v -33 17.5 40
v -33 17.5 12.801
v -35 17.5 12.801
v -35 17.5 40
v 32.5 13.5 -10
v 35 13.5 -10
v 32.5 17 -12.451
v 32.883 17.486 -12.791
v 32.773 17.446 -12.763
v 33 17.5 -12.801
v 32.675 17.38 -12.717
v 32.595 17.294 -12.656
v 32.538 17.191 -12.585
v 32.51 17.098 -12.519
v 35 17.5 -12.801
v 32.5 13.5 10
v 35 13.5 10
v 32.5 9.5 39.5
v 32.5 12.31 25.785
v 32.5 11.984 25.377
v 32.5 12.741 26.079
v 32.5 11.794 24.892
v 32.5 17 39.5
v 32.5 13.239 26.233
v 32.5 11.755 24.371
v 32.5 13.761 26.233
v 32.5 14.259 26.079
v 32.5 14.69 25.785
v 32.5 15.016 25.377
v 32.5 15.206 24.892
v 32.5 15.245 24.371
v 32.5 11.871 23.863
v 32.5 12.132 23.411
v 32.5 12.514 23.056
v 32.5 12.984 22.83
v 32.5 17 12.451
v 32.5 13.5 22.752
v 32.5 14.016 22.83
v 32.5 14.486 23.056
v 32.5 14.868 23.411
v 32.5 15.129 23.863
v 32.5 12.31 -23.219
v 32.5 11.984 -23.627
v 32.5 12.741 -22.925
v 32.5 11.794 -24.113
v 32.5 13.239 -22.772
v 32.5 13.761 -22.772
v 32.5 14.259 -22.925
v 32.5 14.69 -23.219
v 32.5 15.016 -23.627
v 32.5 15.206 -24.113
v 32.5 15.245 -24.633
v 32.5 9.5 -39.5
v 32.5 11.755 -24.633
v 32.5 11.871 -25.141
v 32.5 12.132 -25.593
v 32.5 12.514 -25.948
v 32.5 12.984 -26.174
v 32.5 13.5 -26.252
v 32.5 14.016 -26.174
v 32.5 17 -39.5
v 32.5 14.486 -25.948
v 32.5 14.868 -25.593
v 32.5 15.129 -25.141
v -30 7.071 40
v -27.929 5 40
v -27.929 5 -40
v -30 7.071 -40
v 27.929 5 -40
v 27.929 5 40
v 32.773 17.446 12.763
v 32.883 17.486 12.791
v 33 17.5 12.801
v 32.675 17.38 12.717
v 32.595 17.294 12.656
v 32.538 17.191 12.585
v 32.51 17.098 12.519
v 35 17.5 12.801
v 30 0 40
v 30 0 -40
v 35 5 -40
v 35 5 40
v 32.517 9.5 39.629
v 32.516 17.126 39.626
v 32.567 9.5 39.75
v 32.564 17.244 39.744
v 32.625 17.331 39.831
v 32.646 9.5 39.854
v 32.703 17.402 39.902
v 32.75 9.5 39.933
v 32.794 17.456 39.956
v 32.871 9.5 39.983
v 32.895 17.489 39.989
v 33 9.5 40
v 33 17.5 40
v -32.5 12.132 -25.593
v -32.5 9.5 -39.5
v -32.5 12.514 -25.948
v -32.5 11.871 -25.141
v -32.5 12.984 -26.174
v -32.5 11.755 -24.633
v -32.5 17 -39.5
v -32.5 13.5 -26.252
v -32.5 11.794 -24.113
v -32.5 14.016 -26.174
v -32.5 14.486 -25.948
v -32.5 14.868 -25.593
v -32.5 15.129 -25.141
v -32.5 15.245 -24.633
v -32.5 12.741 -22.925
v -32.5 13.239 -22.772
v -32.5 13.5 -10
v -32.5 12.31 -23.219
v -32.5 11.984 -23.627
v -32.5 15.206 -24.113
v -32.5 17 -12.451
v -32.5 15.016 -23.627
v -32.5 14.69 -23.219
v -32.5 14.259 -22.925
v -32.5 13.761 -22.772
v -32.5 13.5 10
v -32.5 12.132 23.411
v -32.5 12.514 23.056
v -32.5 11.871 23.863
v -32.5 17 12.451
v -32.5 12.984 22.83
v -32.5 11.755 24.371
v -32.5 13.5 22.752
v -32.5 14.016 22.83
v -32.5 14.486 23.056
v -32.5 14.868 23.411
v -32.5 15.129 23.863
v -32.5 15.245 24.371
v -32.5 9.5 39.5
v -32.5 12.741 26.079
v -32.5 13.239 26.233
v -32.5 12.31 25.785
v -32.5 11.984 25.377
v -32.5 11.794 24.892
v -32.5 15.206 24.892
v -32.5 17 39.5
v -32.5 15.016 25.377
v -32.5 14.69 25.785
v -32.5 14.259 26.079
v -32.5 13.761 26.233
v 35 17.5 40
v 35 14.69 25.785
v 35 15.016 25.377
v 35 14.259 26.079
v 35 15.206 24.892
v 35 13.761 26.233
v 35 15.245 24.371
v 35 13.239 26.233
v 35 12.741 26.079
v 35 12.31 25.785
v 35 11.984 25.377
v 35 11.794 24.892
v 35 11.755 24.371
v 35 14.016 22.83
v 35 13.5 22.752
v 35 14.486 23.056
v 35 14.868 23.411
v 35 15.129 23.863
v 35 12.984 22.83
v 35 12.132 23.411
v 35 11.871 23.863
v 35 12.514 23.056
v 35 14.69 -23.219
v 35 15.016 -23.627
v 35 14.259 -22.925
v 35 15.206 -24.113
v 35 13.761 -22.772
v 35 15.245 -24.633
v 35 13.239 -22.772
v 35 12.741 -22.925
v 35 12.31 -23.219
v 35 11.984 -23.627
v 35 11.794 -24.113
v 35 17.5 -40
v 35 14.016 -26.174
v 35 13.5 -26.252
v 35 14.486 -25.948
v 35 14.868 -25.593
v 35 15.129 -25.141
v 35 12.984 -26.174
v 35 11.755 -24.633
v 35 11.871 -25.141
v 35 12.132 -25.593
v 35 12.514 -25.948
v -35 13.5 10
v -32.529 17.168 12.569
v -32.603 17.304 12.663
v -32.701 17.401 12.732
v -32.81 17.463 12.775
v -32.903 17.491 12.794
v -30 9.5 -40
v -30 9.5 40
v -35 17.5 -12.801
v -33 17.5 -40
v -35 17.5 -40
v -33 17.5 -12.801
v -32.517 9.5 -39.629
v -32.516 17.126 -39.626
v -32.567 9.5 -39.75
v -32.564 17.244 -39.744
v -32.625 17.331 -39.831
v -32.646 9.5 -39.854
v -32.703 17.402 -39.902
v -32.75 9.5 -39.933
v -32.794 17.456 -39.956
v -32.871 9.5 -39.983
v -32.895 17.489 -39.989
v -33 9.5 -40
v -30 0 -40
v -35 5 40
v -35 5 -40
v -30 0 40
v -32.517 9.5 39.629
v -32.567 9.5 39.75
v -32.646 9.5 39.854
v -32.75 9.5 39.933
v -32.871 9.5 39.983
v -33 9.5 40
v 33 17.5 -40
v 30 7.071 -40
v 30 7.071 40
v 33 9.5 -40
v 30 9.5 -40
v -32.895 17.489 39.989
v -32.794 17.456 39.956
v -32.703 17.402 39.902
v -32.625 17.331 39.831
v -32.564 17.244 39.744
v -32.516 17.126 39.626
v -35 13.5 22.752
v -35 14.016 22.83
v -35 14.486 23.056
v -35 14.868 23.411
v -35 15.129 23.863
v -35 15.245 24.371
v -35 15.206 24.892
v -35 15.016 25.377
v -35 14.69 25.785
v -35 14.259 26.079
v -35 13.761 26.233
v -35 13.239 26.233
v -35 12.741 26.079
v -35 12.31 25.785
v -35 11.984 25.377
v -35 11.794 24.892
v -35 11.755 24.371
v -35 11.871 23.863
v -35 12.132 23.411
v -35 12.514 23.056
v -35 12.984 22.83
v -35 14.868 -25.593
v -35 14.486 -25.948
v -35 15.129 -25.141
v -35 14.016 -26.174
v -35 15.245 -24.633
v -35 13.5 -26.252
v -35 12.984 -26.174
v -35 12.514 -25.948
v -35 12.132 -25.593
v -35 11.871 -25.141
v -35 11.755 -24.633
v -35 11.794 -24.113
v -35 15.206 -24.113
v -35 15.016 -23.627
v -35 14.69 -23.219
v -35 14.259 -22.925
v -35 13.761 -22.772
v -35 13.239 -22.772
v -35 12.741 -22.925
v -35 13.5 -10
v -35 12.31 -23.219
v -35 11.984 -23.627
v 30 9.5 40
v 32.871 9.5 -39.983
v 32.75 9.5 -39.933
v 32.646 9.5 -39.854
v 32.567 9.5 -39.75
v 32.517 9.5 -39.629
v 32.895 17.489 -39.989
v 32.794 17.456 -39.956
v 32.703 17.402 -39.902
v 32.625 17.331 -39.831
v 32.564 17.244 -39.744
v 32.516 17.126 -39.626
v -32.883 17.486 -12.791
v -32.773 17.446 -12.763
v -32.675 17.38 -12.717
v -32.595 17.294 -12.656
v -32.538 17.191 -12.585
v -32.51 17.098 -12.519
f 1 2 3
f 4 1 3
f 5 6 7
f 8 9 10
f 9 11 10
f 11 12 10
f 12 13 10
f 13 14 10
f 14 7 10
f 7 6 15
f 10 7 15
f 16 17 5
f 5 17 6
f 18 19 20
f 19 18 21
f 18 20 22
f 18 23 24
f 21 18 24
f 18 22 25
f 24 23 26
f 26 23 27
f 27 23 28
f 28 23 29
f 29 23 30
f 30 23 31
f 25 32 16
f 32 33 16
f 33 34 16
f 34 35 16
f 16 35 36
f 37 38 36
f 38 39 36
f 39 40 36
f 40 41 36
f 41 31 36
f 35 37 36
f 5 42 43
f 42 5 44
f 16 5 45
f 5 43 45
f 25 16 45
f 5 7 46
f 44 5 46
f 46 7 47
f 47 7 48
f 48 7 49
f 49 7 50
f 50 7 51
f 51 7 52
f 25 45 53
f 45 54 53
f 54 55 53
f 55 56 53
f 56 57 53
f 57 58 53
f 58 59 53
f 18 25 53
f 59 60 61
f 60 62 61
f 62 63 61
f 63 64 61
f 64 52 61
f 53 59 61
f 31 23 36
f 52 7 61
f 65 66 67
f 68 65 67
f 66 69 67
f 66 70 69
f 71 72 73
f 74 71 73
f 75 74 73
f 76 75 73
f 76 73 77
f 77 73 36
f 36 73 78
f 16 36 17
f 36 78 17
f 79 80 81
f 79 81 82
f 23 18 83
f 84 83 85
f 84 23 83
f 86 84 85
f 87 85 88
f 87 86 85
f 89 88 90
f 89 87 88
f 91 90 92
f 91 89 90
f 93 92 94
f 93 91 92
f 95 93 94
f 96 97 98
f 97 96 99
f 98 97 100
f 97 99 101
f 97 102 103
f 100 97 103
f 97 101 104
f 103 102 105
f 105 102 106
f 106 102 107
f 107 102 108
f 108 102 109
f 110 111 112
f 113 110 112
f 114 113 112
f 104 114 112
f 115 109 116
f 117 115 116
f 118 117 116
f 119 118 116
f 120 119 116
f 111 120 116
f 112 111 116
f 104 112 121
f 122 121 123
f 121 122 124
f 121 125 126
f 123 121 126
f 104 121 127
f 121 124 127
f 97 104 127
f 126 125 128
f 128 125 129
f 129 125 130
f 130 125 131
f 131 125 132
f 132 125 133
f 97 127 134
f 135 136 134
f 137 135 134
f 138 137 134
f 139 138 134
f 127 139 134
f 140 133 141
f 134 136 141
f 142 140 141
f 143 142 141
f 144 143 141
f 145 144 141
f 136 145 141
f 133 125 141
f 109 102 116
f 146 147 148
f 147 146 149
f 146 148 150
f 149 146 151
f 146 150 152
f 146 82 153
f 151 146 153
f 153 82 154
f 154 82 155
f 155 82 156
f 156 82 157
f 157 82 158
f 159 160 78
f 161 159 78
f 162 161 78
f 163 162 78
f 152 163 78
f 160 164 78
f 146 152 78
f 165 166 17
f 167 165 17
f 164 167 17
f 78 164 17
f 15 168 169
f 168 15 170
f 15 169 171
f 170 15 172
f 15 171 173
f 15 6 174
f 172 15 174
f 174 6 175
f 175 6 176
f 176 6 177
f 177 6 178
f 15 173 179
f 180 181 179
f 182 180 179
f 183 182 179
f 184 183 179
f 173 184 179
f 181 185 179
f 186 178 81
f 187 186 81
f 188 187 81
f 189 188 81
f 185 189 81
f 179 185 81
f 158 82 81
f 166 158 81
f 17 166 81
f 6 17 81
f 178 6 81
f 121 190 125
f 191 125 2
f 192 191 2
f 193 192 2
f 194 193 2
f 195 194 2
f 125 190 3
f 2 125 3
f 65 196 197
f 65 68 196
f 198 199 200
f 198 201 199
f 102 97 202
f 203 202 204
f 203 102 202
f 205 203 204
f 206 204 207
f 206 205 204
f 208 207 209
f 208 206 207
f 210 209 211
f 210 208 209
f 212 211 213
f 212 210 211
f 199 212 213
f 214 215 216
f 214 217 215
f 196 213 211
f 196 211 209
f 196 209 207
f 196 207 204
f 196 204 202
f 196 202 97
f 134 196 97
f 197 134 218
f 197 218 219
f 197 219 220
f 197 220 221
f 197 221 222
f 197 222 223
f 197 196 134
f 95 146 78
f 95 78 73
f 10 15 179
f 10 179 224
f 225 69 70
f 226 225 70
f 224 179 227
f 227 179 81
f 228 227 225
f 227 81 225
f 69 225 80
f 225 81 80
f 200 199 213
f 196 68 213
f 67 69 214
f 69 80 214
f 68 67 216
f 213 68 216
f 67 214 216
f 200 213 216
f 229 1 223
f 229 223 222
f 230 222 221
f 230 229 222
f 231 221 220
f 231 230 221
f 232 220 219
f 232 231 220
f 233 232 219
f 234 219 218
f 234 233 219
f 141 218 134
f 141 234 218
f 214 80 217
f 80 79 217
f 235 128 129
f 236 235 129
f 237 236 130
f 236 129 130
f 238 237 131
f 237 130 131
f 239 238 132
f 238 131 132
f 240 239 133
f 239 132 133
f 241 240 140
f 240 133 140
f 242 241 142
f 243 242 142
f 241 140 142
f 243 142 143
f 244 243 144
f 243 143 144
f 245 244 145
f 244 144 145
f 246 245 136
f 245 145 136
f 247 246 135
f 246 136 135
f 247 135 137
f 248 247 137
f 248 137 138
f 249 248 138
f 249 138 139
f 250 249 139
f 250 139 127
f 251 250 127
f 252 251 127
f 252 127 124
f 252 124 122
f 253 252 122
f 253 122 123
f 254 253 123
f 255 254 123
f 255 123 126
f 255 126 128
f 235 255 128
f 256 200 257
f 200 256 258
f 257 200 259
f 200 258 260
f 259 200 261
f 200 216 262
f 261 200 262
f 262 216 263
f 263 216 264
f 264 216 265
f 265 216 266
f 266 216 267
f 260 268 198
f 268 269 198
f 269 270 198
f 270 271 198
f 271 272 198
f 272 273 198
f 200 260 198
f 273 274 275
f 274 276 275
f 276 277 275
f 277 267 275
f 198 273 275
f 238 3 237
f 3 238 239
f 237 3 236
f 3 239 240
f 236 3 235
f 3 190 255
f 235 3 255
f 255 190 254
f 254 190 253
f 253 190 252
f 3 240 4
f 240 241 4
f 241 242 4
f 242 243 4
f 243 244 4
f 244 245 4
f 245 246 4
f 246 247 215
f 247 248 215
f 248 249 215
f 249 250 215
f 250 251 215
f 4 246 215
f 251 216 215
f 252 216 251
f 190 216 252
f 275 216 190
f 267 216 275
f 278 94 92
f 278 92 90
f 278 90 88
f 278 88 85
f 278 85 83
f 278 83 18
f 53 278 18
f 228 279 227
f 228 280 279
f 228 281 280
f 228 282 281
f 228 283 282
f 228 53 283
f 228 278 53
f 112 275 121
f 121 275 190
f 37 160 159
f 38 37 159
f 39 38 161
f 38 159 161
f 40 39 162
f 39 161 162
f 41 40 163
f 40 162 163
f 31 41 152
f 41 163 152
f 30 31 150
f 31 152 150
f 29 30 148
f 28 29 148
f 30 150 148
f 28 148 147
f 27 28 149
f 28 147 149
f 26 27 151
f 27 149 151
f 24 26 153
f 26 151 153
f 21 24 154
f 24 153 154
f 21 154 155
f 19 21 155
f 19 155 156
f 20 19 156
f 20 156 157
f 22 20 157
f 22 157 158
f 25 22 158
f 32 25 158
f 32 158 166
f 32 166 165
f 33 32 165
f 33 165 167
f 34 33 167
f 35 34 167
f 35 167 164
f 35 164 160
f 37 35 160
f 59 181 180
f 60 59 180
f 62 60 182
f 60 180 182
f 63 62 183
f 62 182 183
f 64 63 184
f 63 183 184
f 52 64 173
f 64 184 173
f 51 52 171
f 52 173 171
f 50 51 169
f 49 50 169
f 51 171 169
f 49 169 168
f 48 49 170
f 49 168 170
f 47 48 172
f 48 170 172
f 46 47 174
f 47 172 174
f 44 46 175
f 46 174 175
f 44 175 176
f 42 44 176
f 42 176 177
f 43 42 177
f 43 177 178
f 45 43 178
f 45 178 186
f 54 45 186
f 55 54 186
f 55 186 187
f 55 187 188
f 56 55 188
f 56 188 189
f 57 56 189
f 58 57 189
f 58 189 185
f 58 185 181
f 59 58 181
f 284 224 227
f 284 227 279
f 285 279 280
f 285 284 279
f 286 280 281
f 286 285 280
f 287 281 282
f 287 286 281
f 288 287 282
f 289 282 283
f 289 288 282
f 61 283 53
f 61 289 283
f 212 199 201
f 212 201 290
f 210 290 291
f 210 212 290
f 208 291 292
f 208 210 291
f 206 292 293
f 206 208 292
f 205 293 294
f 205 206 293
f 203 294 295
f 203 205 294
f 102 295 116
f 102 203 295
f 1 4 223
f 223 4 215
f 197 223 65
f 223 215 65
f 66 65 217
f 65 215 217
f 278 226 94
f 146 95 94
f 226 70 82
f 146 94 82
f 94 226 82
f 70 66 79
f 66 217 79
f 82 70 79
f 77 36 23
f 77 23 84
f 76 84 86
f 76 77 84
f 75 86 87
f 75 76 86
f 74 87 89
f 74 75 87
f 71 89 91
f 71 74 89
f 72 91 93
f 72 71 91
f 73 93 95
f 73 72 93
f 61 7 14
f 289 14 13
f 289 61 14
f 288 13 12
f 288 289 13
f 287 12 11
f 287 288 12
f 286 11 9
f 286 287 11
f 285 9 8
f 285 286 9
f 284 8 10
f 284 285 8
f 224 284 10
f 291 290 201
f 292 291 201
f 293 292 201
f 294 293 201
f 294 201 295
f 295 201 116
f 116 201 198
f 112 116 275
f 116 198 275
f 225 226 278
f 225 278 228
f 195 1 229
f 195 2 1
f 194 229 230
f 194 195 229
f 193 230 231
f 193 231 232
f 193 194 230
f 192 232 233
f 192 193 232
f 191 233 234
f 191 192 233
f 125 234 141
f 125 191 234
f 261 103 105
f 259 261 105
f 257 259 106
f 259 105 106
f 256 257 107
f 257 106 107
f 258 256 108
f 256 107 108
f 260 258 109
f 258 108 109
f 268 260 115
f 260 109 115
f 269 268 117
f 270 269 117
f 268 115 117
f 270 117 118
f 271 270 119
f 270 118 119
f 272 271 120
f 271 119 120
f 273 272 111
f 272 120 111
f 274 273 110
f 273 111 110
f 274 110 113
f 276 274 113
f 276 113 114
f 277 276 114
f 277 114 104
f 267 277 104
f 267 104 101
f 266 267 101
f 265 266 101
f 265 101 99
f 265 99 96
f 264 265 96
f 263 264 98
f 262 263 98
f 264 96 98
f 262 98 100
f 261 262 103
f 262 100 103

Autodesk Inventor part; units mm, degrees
ref_plane "YZ Plane" through (0, 0, 0) normal (1, 0, 0) x (0, 1, 0)
ref_plane "XZ Plane" through (0, 0, 0) normal (0, 1, 0) x (-1, 0, 0)
ref_plane "XY Plane" through (0, 0, 0) normal (0, 0, 1) x (1, 0, 0)
sketch "Sketch1" plane through (0, 0, 0) normal (0, 1, 0) x (-1, 0, 0)
  line L0 (35, 40) -> (-35, 40)
  line L1 (-35, 40) -> (-35, -40)
  line L2 (-35, -40) -> (35, -40)
  line L3 (35, -40) -> (35, 40)
  line L4 (35, 40) -> (-35, -40) construction
  line L5 (-35, 40) -> (35, -40) construction
  point P0 (0, 0)
  dimension "d0" = 70
  dimension "d1" = 80
extrude "Extrusion1" add sketch "Sketch1" along normal blind 17.5
chamfer "Chamfer1" distance 5 angle 45 2 edges at (35, 0, 0) (-35, 0, 0)
shell "Shell1" thickness 5 removed faces 3 at (10, 11.6667, 40) at (11.6667, 17.5, 13.3333) at (-10, 11.6667, -40)
ref_plane "Work Plane1" through (0, 17.5, -40) normal (-1, 0, 0) x (0, 0, 1)
ref_plane "Work Plane2" through (-30, 0, 0) normal (0, 0, 1) x (1, 0, 0)
sketch "Sketch6" plane through (30, 17.5, 40) normal (1, 0, 0) x (0, 0, -1)
  line L0 (80, -12.5) -> (0, -12.5) projected
  line L1 (80, -12.5) -> (80, 0) projected
  line L2 (0, 0) -> (80, 0) projected
  line L3 (0, -12.5) -> (0, 0) projected
  line L4 (0, 0) -> (0, -10.4289) projected
  line L5 (0, -8) -> (80, -8)
  point P0 (40, -17.5)
  dimension "d31" = 8
extrude "Extrusion6" cut sketch "Sketch6" along normal blind 2.5 contours L5 L3 L2 L1
sketch "Sketch11" plane through (35, 17.5, 40) normal (1, 0, 0) x (0, 0, -1)
  line L0 (0, 9) -> (16.2241, 9) projected
  line L1 (0, 9) -> (0, 0) projected
  line L2 (0, 0) -> (27.1992, 0) projected
  line L3 (27.1992, 0) -> (30, -4) projected
  line L4 (30, -4) -> (50, -4) projected
  line L5 (50, -4) -> (52.8008, 0) projected
  line L6 (52.8008, 0) -> (80, 0) projected
  line L7 (80, 9) -> (80, 0) projected
  line L8 (63.7759, 9) -> (80, 9) projected
  line L9 (63.7759, 9) -> (60, 4.5) projected
  line L10 (20, 4.5) -> (60, 4.5) projected
  line L11 (20, 4.5) -> (16.2241, 9) projected
  line L12 (52.8008, 0) -> (27.1992, 0)
  line L13 (80, 0) -> (0, 0) projected
  point P0 (40, -17.5)
extrude "Extrusion11" cut sketch "Sketch11" against normal up to surface (2.5 mm away) contours L12 L5 L4 L3
fillet "Fillet3" radius 0.5 4 edges at (32.5, 17.5, -26.4004) (32.5, 17.5, 26.4004) (32.5, 13.5, -40) (32.5, 13.5, 40)
mirror "Mirror3" about plane through (0, 17.5, -40) normal (-1, 0, 0) of "Extrusion6", "Fillet3", "Extrusion11"
sketch "Sketch10" plane through (35, 17.5, 40) normal (1, 0, 0) x (0, 0, -1)
  circle A0 centre (15.4979, -4) radius 1.75 projected
  circle A1 centre (64.5021, -4) radius 1.75 projected
  point P0 (40, -17.5)
extrude "Extrusion10" cut sketch "Sketch10" against normal through all
sketch "Sketch12" plane through (-30, 0, 40) normal (0, 0, 1) x (1, 0, 0)
  line L0 (0, 9.5) -> (-3, 9.5) projected
  line L1 (-3, 17.5) -> (-3, 9.5) projected
  line L2 (-5, 17.5) -> (-3, 17.5) projected
  line L3 (-5, 5) -> (-5, 17.5) projected
  line L4 (0, 0) -> (-5, 5) projected
  line L5 (0, 0) -> (60, 0) projected
  line L6 (65, 5) -> (60, 0) projected
  line L7 (65, 5) -> (65, 17.5) projected
  line L8 (63, 17.5) -> (65, 17.5) projected
  line L9 (63, 9.5) -> (63, 17.5) projected
  line L10 (63, 9.5) -> (60, 9.5) projected
  line L11 (60, 9.5) -> (60, 7.0711) projected
  line L12 (60, 7.0711) -> (57.9289, 5) projected
  line L13 (57.9289, 5) -> (2.0711, 5) projected
  line L14 (2.0711, 5) -> (0, 7.0711) projected
  line L15 (0, 7.0711) -> (0, 9.5) projected
  line L16 (0, 0) -> (60, 0) projected
  line L17 (60, 0) -> (65, 0)
  line L18 (65, 0) -> (65, 5)
  point P0 (30, 0)
properties part number "A-02"
